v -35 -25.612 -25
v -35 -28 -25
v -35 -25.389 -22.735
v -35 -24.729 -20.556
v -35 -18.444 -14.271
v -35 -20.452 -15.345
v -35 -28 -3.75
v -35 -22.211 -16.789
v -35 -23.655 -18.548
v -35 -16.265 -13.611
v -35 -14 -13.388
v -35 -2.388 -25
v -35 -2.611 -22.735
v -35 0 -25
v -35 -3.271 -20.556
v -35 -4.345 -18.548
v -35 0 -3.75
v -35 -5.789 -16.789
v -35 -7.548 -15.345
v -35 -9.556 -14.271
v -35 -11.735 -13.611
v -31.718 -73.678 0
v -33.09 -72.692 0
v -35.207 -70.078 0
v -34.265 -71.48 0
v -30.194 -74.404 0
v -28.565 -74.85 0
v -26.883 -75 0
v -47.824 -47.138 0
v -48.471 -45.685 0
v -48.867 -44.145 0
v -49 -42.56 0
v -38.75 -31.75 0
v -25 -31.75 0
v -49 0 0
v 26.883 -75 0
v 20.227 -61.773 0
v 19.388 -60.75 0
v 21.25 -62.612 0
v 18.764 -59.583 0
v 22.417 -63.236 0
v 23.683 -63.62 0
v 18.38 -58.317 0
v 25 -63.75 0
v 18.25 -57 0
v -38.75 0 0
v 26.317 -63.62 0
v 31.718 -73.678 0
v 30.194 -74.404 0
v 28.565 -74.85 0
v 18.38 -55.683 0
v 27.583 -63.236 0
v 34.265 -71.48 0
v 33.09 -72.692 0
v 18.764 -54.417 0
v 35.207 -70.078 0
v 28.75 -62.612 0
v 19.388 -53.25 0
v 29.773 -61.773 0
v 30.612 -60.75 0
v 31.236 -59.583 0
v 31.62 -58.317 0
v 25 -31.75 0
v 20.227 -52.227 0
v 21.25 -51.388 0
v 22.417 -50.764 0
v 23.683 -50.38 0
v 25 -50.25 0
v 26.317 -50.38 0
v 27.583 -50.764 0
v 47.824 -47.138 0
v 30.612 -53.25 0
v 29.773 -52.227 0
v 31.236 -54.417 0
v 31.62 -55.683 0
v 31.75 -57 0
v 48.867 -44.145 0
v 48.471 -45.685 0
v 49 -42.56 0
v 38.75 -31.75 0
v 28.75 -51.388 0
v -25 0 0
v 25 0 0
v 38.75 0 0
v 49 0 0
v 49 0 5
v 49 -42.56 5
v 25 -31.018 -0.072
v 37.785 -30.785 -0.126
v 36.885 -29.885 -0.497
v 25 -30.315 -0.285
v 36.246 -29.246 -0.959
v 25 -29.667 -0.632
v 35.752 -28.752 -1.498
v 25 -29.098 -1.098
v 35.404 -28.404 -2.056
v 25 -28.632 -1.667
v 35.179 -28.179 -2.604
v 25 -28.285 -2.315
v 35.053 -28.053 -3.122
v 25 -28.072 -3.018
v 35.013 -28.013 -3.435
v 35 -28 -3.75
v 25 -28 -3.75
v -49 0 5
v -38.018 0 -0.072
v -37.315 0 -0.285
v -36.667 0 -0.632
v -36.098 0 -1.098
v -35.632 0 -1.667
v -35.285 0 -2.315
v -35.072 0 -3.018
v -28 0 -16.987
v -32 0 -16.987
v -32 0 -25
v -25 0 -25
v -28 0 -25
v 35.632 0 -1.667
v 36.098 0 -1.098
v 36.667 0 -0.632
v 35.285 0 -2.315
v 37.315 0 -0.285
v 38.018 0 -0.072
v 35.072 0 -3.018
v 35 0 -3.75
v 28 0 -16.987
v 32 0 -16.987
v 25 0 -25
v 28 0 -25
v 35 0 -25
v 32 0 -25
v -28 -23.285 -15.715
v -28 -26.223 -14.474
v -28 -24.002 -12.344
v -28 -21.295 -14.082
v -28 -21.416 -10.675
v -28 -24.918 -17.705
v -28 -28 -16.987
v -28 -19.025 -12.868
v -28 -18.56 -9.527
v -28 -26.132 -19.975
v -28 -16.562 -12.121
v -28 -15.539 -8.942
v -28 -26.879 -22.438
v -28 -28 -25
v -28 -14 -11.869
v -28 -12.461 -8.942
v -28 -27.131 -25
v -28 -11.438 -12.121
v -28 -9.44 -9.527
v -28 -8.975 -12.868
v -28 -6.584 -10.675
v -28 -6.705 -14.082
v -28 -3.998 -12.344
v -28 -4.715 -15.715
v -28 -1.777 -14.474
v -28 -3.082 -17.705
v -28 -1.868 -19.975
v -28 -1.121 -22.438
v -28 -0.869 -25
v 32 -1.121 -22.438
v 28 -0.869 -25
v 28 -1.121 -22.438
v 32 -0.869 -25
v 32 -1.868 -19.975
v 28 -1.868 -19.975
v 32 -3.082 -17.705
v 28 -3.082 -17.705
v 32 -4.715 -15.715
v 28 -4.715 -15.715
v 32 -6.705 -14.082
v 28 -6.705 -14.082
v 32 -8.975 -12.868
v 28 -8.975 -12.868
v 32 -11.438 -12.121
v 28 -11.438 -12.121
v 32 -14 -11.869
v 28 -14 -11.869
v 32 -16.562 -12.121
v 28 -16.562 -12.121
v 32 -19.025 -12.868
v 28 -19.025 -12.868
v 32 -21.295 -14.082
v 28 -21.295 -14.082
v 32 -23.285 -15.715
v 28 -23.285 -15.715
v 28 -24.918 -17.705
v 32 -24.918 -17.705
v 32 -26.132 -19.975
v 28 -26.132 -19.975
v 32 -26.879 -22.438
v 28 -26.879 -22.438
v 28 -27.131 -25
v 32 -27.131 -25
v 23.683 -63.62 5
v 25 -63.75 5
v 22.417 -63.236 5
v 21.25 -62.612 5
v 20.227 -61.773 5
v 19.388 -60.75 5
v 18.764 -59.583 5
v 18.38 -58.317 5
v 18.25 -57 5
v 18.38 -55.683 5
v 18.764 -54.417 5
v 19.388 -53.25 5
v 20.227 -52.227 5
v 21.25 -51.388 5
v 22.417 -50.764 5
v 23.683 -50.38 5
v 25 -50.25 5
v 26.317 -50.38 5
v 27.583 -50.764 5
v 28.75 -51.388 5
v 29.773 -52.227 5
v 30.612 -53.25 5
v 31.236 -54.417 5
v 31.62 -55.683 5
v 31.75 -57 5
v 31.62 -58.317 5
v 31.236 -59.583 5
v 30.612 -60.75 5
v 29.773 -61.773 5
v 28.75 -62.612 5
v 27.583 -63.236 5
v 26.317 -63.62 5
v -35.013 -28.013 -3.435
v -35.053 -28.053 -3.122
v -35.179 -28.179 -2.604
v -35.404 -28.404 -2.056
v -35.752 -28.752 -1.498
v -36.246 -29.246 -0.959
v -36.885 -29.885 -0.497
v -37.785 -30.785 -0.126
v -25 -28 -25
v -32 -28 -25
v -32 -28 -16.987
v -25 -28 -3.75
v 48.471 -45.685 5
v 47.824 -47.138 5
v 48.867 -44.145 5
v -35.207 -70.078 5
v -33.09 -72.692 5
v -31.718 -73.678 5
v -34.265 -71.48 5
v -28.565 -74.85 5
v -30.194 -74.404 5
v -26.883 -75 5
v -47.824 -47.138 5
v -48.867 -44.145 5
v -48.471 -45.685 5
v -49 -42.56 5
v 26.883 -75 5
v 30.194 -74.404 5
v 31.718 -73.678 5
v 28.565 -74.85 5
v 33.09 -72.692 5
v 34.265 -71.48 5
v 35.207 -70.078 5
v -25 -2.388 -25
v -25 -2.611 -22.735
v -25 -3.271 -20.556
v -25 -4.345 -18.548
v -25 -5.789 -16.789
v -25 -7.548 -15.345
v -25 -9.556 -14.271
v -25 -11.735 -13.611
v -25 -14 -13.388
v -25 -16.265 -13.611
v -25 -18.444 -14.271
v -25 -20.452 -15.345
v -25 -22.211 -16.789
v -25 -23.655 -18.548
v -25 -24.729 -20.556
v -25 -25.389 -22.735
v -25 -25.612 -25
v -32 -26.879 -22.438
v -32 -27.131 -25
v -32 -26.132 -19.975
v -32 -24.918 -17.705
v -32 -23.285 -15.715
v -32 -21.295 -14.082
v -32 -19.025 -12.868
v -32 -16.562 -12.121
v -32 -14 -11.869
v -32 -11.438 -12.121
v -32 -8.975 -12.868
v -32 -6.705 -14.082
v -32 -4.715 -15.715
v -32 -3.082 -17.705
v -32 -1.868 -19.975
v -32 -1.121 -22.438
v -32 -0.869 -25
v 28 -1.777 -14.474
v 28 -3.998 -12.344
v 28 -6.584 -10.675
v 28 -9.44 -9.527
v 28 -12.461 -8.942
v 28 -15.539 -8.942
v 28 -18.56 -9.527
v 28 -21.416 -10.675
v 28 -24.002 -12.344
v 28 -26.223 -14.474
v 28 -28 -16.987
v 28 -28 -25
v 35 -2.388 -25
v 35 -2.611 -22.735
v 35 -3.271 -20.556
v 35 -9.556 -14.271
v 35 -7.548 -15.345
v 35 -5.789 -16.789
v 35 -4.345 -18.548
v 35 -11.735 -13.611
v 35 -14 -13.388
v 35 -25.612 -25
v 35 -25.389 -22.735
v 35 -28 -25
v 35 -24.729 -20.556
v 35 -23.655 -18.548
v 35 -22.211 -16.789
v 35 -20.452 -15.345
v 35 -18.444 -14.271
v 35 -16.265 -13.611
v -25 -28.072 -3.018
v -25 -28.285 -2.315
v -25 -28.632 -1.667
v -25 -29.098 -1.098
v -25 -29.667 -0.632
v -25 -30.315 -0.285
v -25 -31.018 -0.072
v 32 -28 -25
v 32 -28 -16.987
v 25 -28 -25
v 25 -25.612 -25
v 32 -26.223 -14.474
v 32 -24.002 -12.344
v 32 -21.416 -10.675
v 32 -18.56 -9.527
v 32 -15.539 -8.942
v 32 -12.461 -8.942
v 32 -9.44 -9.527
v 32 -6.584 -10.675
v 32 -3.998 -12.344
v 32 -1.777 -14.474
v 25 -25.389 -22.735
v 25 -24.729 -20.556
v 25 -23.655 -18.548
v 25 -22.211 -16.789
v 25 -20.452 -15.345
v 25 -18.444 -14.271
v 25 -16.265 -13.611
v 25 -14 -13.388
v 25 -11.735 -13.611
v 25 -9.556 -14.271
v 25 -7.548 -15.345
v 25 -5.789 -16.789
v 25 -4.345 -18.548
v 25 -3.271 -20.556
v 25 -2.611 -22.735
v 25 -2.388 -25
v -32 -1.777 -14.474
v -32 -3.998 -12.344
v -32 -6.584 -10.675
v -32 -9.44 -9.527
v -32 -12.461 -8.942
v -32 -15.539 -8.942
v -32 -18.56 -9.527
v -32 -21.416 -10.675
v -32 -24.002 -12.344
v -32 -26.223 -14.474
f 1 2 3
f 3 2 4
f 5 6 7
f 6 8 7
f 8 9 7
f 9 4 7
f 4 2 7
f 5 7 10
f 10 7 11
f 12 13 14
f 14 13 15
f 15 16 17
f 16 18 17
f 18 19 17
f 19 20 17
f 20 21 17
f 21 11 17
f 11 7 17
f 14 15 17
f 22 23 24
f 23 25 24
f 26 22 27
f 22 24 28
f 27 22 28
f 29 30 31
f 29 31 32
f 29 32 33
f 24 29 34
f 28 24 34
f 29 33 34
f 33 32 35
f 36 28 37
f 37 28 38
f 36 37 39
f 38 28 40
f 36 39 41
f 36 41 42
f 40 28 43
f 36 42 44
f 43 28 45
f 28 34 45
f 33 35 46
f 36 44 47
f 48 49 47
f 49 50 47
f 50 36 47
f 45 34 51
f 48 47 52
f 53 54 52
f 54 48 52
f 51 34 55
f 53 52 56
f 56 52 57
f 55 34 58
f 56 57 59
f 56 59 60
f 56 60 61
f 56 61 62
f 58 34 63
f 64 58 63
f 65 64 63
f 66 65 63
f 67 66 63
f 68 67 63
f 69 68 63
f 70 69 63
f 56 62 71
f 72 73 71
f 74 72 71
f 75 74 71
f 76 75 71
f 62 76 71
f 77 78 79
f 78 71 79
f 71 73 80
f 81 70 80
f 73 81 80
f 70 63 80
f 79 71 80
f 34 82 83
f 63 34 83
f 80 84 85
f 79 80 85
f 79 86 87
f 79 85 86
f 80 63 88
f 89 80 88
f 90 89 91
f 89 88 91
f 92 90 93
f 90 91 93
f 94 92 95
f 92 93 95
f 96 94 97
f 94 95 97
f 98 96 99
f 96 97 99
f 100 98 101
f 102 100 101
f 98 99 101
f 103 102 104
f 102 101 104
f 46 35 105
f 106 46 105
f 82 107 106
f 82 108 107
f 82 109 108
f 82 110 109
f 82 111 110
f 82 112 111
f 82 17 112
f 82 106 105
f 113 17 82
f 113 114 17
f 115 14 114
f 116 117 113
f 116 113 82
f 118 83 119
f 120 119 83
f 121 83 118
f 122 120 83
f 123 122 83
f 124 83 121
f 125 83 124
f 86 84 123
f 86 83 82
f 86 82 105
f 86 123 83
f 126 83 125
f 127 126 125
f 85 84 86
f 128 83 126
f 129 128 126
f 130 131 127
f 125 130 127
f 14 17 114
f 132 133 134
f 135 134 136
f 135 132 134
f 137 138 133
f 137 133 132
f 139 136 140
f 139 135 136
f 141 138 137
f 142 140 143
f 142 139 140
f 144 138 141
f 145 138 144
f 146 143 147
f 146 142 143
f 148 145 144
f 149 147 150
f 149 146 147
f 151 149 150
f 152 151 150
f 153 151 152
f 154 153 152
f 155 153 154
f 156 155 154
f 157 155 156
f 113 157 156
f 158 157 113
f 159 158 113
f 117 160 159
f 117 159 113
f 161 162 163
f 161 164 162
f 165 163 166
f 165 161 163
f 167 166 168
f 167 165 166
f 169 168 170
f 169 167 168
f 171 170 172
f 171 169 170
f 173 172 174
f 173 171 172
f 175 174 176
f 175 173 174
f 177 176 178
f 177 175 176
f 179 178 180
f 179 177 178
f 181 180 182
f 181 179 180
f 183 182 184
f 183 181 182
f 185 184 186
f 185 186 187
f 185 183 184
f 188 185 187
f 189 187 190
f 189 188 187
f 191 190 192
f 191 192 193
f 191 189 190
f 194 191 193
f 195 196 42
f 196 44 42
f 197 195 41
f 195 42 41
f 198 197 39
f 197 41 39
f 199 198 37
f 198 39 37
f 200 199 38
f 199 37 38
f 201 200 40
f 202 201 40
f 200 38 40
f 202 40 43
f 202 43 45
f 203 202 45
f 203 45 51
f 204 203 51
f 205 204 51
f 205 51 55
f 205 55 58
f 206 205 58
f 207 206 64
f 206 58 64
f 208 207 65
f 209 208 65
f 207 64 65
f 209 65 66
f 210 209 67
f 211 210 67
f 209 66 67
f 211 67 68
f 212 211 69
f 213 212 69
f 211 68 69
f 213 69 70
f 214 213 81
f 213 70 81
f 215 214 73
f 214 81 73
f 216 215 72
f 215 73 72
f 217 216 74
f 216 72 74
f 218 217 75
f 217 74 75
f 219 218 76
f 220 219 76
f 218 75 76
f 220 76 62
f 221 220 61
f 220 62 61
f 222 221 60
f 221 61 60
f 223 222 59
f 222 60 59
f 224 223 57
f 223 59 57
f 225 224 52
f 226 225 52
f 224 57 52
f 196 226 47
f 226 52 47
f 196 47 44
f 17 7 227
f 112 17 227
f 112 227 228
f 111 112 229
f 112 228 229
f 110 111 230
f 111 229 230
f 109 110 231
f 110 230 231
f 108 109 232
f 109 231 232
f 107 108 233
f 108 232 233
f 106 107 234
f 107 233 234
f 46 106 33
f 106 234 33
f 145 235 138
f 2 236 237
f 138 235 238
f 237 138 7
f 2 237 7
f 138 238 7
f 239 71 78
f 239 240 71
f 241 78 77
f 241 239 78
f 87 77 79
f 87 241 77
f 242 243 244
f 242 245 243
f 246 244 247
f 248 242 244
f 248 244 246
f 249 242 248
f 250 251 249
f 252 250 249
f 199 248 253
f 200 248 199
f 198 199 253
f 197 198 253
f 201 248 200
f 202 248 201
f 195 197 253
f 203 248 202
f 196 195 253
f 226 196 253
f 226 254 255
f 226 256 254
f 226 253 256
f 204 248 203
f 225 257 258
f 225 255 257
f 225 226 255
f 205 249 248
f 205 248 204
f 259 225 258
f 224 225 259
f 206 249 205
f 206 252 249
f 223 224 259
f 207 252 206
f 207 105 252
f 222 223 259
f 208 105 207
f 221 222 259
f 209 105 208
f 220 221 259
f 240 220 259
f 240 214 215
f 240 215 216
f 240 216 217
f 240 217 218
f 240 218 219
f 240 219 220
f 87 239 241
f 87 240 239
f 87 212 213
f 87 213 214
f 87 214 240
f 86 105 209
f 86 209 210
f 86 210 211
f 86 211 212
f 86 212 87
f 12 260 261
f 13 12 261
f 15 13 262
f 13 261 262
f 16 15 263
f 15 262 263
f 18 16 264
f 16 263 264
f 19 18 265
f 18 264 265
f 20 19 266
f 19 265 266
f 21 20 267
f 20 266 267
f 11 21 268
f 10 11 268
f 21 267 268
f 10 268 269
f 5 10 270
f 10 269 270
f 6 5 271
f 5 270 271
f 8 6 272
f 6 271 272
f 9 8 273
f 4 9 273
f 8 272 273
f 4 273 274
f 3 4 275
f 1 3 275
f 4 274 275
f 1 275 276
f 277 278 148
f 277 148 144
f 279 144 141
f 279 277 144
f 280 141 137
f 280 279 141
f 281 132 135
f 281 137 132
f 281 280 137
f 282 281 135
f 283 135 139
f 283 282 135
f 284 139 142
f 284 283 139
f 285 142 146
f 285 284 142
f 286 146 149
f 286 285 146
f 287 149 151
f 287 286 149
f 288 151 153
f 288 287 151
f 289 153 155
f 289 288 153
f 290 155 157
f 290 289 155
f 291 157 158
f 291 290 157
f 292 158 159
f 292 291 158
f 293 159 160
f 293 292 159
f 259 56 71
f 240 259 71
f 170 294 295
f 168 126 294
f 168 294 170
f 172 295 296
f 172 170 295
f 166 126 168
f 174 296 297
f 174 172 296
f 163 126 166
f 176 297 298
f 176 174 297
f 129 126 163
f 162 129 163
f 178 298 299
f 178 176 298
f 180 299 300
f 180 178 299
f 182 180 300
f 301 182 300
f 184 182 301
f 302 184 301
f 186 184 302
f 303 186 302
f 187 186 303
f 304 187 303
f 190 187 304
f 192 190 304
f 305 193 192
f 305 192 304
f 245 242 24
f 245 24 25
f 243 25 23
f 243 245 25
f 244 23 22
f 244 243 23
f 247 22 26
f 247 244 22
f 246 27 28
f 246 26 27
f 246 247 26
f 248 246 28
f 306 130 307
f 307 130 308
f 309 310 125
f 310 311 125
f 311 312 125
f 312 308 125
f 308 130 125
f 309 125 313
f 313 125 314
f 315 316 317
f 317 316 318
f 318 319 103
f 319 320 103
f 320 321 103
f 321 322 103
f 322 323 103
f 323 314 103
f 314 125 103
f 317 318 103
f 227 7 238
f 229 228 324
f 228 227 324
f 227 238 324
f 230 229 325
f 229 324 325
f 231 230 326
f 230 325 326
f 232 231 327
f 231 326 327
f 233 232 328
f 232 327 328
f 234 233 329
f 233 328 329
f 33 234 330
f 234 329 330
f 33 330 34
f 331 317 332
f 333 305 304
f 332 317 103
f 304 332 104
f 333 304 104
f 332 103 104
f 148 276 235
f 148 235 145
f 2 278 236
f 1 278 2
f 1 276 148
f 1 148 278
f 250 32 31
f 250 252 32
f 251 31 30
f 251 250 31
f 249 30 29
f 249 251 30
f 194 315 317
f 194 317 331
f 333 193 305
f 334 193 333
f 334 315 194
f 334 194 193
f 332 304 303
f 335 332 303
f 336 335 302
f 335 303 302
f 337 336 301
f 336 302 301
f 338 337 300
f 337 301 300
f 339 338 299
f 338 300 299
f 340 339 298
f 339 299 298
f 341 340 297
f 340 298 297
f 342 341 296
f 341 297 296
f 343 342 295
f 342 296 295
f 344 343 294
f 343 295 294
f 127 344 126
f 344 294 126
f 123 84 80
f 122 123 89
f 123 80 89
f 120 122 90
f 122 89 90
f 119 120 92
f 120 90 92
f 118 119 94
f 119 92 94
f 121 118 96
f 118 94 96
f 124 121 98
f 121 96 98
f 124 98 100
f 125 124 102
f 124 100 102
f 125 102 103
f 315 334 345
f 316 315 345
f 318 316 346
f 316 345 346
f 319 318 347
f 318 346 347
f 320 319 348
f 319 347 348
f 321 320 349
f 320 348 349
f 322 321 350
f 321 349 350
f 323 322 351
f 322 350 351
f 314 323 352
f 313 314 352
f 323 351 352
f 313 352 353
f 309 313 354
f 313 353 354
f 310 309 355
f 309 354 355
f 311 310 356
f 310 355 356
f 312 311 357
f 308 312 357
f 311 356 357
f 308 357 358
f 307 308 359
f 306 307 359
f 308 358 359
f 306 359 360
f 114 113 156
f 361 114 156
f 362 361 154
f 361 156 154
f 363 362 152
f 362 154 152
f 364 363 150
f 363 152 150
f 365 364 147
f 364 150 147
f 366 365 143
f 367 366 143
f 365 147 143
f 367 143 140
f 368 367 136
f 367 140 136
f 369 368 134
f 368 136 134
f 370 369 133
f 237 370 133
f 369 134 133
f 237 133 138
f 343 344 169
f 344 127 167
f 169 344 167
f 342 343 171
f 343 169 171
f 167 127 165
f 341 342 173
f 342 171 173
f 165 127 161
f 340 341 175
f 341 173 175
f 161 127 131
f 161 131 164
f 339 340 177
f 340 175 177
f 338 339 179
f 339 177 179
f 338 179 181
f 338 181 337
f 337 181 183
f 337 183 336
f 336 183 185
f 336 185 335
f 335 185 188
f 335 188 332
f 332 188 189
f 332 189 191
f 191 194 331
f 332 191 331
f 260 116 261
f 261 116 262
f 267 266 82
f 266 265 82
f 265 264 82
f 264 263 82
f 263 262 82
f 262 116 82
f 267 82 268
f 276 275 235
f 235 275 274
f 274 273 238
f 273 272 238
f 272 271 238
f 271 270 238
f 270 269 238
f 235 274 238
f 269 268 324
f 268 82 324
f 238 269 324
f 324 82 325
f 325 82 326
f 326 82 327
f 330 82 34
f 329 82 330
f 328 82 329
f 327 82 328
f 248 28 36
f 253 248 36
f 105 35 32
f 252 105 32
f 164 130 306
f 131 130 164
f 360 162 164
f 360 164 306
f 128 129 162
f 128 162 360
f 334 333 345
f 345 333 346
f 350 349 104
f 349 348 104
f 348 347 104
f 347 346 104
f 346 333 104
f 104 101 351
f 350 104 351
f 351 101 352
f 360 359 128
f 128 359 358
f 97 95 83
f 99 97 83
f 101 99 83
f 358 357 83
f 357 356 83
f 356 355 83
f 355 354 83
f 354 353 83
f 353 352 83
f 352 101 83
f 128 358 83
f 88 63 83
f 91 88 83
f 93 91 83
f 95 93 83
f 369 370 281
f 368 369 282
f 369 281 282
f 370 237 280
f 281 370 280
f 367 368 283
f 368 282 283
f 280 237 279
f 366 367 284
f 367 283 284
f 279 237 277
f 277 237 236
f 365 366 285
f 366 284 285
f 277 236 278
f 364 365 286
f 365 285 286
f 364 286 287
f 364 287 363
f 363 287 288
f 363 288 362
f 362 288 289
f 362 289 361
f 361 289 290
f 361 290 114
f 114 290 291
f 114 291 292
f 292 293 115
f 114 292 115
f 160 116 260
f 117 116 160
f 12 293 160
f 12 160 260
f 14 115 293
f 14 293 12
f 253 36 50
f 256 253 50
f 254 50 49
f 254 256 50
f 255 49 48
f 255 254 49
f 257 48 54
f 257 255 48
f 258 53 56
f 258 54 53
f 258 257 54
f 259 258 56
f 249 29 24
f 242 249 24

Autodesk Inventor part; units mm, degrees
ref_plane "YZ Plane" through (0, 0, 0) normal (1, 0, 0) x (0, 1, 0)
ref_plane "XZ Plane" through (0, 0, 0) normal (0, 1, 0) x (-1, 0, 0)
sketch "Sketch1" plane through (0, 0, 0) normal (0, 0, 1) x (1, 0, 0)
  line L0 (-49, 0) -> (49, 0)
  line L1 (-32.5, -75) -> (32.5, -75)
  line L2 (-49, 0) -> (-49, -45)
  line L3 (49, 0) -> (49, -45)
  line L4 (-49, -45) -> (-32.5, -75)
  line L5 (32.5, -75) -> (49, -45)
  point P0 (0, 0)
  point P1 (0, 0)
  point P2 (0, -75)
  dimension "d0" = 98
  dimension "d1" = 65
  dimension "d2" = 75
  dimension "d4" = 45
extrude "Extrusion1" add sketch "Sketch1" along normal blind 5
sketch "Sketch2" plane through (0, 0, 0) normal (0, 0, -1) x (-1, 0, 0)
  line L0 (-25, 0) -> (25, 0) construction
  line L1 (49, 0) -> (-49, 0) projected
  line L2 (-25, 0) -> (-35, 0)
  line L3 (-35, 0) -> (-35, -28)
  line L4 (-35, -28) -> (-25, -28)
  line L5 (-25, -28) -> (-25, 0)
  point P0 (0, 0)
  point P1 (0, 0)
  dimension "d7" = 50
  dimension "d8" = 10
  dimension "d9" = 28
extrude "Extrusion2" add sketch "Sketch2" along normal blind 25
sketch "Sketch3" plane through (25, -28, 0) normal (-1, 0, 0) x (0, 0, 1)
  line L0 (-25, 0) -> (-25, 28) projected
  circle A0 centre (-25, 14) radius 11.1125
  point P0 (0, 28)
  dimension "d12" = 22.225
extrude "Extrusion3" cut sketch "Sketch3" against normal through all
ref_plane "Work Plane1" through (30, -28, 0) normal (1, 0, 0) x (0, 0, -1)
sketch "Sketch4" plane through (30, -28, 0) normal (1, 0, 0) x (0, 0, -1)
  arc A0 (25, 25.1125) -> (25, 2.8875) centre (25, 14) ccw projected
  circle A1 centre (25, 14) radius 14.6312
  point P0 (0, 28)
  point P1 (25, -0.6312)
  point P2 (25, 28.6312)
sketch "Sketch5" plane through (0, 0, -25) normal (0, 0, -1) x (-1, 0, 0)
  line L0 (-28, -27.1312) -> (-32, -27.1312)
  line L1 (-32, -27.1312) -> (-32, -30.1312)
  line L2 (-32, -30.1312) -> (-28, -30.1312)
  line L3 (-28, -30.1312) -> (-28, -27.1312)
  line L4 (-28, -27.1312) -> (-32, -30.1312) construction
  line L5 (-32, -27.1312) -> (-28, -30.1312) construction
  line L6 (68.6, -14) -> (-68.6, -14) projected
  point P0 (0, 0)
  point P1 (-30, -28.6312)
  dimension "d17" = 4
  dimension "d18" = 3
revolve "Revolution1" cut sketch "Sketch5" angle 360 about axis through (30, -14, -25) along (1, 0, 0)
mirror "Mirror1" about plane through (0, 0, 0) normal (1, 0, 0) of "Extrusion2", "Extrusion3", "Revolution1"
fillet "Fillet1" radius 9.5 4 edges at (-32.5, -75, 2.5) (32.5, -75, 2.5) (49, -45, 2.5) (-49, -45, 2.5)
fillet "Fillet2" radius 3.75 4 edges at (35, -14, 0) (-35, -14, 0) (-30, -28, 0) (30, -28, 0)
thicken "Thicken1" operation add thickness 0.5 both sides no extend neighbours yes toward (0, -0.9485364, 0.316668) faces at (-28.3333, -24.5406, -21.481)
thicken "Thicken2" operation add thickness 0.5 both sides no extend neighbours yes toward (0, -0.8451901, 0.5344658) faces at (28.3333, -23.3922, -19.0607)
sketch "Sketch6" plane through (0, 0, 5) normal (0, 0, 1) x (1, 0, 0)
  arc A0 (-49, -42.5599) -> (-47.8241, -47.1381) centre (-39.5, -42.5599) ccw projected
  line L0 (-47.8241, -47.1381) -> (-35.207, -70.0782) projected
  arc A1 (-35.207, -70.0782) -> (-26.8829, -75) centre (-26.8829, -65.5) ccw projected
  line L1 (-26.8829, -75) -> (26.8829, -75) projected
  arc A2 (26.8829, -75) -> (35.207, -70.0782) centre (26.8829, -65.5) ccw projected
  line L2 (35.207, -70.0782) -> (47.8241, -47.1381) projected
  arc A3 (47.8241, -47.1381) -> (49, -42.5599) centre (39.5, -42.5599) ccw projected
  line L3 (49, -42.5599) -> (49, 0) projected
  line L4 (49, 0) -> (-49, 0) projected
  line L5 (-49, 0) -> (-49, -42.5599) projected
  point P0 (0, 0)
  point P1 (25, -57)
  point P2 (-33, -59)
  dimension "d26" = 18
  dimension "d27" = 24
  dimension "d28" = 16
  dimension "d29" = 16
hole "Hole1" at (25, -57, 5) direction (0, 0, -1) diameter 13.5 end through all
properties part number "7-8 HandlebarPlate"
